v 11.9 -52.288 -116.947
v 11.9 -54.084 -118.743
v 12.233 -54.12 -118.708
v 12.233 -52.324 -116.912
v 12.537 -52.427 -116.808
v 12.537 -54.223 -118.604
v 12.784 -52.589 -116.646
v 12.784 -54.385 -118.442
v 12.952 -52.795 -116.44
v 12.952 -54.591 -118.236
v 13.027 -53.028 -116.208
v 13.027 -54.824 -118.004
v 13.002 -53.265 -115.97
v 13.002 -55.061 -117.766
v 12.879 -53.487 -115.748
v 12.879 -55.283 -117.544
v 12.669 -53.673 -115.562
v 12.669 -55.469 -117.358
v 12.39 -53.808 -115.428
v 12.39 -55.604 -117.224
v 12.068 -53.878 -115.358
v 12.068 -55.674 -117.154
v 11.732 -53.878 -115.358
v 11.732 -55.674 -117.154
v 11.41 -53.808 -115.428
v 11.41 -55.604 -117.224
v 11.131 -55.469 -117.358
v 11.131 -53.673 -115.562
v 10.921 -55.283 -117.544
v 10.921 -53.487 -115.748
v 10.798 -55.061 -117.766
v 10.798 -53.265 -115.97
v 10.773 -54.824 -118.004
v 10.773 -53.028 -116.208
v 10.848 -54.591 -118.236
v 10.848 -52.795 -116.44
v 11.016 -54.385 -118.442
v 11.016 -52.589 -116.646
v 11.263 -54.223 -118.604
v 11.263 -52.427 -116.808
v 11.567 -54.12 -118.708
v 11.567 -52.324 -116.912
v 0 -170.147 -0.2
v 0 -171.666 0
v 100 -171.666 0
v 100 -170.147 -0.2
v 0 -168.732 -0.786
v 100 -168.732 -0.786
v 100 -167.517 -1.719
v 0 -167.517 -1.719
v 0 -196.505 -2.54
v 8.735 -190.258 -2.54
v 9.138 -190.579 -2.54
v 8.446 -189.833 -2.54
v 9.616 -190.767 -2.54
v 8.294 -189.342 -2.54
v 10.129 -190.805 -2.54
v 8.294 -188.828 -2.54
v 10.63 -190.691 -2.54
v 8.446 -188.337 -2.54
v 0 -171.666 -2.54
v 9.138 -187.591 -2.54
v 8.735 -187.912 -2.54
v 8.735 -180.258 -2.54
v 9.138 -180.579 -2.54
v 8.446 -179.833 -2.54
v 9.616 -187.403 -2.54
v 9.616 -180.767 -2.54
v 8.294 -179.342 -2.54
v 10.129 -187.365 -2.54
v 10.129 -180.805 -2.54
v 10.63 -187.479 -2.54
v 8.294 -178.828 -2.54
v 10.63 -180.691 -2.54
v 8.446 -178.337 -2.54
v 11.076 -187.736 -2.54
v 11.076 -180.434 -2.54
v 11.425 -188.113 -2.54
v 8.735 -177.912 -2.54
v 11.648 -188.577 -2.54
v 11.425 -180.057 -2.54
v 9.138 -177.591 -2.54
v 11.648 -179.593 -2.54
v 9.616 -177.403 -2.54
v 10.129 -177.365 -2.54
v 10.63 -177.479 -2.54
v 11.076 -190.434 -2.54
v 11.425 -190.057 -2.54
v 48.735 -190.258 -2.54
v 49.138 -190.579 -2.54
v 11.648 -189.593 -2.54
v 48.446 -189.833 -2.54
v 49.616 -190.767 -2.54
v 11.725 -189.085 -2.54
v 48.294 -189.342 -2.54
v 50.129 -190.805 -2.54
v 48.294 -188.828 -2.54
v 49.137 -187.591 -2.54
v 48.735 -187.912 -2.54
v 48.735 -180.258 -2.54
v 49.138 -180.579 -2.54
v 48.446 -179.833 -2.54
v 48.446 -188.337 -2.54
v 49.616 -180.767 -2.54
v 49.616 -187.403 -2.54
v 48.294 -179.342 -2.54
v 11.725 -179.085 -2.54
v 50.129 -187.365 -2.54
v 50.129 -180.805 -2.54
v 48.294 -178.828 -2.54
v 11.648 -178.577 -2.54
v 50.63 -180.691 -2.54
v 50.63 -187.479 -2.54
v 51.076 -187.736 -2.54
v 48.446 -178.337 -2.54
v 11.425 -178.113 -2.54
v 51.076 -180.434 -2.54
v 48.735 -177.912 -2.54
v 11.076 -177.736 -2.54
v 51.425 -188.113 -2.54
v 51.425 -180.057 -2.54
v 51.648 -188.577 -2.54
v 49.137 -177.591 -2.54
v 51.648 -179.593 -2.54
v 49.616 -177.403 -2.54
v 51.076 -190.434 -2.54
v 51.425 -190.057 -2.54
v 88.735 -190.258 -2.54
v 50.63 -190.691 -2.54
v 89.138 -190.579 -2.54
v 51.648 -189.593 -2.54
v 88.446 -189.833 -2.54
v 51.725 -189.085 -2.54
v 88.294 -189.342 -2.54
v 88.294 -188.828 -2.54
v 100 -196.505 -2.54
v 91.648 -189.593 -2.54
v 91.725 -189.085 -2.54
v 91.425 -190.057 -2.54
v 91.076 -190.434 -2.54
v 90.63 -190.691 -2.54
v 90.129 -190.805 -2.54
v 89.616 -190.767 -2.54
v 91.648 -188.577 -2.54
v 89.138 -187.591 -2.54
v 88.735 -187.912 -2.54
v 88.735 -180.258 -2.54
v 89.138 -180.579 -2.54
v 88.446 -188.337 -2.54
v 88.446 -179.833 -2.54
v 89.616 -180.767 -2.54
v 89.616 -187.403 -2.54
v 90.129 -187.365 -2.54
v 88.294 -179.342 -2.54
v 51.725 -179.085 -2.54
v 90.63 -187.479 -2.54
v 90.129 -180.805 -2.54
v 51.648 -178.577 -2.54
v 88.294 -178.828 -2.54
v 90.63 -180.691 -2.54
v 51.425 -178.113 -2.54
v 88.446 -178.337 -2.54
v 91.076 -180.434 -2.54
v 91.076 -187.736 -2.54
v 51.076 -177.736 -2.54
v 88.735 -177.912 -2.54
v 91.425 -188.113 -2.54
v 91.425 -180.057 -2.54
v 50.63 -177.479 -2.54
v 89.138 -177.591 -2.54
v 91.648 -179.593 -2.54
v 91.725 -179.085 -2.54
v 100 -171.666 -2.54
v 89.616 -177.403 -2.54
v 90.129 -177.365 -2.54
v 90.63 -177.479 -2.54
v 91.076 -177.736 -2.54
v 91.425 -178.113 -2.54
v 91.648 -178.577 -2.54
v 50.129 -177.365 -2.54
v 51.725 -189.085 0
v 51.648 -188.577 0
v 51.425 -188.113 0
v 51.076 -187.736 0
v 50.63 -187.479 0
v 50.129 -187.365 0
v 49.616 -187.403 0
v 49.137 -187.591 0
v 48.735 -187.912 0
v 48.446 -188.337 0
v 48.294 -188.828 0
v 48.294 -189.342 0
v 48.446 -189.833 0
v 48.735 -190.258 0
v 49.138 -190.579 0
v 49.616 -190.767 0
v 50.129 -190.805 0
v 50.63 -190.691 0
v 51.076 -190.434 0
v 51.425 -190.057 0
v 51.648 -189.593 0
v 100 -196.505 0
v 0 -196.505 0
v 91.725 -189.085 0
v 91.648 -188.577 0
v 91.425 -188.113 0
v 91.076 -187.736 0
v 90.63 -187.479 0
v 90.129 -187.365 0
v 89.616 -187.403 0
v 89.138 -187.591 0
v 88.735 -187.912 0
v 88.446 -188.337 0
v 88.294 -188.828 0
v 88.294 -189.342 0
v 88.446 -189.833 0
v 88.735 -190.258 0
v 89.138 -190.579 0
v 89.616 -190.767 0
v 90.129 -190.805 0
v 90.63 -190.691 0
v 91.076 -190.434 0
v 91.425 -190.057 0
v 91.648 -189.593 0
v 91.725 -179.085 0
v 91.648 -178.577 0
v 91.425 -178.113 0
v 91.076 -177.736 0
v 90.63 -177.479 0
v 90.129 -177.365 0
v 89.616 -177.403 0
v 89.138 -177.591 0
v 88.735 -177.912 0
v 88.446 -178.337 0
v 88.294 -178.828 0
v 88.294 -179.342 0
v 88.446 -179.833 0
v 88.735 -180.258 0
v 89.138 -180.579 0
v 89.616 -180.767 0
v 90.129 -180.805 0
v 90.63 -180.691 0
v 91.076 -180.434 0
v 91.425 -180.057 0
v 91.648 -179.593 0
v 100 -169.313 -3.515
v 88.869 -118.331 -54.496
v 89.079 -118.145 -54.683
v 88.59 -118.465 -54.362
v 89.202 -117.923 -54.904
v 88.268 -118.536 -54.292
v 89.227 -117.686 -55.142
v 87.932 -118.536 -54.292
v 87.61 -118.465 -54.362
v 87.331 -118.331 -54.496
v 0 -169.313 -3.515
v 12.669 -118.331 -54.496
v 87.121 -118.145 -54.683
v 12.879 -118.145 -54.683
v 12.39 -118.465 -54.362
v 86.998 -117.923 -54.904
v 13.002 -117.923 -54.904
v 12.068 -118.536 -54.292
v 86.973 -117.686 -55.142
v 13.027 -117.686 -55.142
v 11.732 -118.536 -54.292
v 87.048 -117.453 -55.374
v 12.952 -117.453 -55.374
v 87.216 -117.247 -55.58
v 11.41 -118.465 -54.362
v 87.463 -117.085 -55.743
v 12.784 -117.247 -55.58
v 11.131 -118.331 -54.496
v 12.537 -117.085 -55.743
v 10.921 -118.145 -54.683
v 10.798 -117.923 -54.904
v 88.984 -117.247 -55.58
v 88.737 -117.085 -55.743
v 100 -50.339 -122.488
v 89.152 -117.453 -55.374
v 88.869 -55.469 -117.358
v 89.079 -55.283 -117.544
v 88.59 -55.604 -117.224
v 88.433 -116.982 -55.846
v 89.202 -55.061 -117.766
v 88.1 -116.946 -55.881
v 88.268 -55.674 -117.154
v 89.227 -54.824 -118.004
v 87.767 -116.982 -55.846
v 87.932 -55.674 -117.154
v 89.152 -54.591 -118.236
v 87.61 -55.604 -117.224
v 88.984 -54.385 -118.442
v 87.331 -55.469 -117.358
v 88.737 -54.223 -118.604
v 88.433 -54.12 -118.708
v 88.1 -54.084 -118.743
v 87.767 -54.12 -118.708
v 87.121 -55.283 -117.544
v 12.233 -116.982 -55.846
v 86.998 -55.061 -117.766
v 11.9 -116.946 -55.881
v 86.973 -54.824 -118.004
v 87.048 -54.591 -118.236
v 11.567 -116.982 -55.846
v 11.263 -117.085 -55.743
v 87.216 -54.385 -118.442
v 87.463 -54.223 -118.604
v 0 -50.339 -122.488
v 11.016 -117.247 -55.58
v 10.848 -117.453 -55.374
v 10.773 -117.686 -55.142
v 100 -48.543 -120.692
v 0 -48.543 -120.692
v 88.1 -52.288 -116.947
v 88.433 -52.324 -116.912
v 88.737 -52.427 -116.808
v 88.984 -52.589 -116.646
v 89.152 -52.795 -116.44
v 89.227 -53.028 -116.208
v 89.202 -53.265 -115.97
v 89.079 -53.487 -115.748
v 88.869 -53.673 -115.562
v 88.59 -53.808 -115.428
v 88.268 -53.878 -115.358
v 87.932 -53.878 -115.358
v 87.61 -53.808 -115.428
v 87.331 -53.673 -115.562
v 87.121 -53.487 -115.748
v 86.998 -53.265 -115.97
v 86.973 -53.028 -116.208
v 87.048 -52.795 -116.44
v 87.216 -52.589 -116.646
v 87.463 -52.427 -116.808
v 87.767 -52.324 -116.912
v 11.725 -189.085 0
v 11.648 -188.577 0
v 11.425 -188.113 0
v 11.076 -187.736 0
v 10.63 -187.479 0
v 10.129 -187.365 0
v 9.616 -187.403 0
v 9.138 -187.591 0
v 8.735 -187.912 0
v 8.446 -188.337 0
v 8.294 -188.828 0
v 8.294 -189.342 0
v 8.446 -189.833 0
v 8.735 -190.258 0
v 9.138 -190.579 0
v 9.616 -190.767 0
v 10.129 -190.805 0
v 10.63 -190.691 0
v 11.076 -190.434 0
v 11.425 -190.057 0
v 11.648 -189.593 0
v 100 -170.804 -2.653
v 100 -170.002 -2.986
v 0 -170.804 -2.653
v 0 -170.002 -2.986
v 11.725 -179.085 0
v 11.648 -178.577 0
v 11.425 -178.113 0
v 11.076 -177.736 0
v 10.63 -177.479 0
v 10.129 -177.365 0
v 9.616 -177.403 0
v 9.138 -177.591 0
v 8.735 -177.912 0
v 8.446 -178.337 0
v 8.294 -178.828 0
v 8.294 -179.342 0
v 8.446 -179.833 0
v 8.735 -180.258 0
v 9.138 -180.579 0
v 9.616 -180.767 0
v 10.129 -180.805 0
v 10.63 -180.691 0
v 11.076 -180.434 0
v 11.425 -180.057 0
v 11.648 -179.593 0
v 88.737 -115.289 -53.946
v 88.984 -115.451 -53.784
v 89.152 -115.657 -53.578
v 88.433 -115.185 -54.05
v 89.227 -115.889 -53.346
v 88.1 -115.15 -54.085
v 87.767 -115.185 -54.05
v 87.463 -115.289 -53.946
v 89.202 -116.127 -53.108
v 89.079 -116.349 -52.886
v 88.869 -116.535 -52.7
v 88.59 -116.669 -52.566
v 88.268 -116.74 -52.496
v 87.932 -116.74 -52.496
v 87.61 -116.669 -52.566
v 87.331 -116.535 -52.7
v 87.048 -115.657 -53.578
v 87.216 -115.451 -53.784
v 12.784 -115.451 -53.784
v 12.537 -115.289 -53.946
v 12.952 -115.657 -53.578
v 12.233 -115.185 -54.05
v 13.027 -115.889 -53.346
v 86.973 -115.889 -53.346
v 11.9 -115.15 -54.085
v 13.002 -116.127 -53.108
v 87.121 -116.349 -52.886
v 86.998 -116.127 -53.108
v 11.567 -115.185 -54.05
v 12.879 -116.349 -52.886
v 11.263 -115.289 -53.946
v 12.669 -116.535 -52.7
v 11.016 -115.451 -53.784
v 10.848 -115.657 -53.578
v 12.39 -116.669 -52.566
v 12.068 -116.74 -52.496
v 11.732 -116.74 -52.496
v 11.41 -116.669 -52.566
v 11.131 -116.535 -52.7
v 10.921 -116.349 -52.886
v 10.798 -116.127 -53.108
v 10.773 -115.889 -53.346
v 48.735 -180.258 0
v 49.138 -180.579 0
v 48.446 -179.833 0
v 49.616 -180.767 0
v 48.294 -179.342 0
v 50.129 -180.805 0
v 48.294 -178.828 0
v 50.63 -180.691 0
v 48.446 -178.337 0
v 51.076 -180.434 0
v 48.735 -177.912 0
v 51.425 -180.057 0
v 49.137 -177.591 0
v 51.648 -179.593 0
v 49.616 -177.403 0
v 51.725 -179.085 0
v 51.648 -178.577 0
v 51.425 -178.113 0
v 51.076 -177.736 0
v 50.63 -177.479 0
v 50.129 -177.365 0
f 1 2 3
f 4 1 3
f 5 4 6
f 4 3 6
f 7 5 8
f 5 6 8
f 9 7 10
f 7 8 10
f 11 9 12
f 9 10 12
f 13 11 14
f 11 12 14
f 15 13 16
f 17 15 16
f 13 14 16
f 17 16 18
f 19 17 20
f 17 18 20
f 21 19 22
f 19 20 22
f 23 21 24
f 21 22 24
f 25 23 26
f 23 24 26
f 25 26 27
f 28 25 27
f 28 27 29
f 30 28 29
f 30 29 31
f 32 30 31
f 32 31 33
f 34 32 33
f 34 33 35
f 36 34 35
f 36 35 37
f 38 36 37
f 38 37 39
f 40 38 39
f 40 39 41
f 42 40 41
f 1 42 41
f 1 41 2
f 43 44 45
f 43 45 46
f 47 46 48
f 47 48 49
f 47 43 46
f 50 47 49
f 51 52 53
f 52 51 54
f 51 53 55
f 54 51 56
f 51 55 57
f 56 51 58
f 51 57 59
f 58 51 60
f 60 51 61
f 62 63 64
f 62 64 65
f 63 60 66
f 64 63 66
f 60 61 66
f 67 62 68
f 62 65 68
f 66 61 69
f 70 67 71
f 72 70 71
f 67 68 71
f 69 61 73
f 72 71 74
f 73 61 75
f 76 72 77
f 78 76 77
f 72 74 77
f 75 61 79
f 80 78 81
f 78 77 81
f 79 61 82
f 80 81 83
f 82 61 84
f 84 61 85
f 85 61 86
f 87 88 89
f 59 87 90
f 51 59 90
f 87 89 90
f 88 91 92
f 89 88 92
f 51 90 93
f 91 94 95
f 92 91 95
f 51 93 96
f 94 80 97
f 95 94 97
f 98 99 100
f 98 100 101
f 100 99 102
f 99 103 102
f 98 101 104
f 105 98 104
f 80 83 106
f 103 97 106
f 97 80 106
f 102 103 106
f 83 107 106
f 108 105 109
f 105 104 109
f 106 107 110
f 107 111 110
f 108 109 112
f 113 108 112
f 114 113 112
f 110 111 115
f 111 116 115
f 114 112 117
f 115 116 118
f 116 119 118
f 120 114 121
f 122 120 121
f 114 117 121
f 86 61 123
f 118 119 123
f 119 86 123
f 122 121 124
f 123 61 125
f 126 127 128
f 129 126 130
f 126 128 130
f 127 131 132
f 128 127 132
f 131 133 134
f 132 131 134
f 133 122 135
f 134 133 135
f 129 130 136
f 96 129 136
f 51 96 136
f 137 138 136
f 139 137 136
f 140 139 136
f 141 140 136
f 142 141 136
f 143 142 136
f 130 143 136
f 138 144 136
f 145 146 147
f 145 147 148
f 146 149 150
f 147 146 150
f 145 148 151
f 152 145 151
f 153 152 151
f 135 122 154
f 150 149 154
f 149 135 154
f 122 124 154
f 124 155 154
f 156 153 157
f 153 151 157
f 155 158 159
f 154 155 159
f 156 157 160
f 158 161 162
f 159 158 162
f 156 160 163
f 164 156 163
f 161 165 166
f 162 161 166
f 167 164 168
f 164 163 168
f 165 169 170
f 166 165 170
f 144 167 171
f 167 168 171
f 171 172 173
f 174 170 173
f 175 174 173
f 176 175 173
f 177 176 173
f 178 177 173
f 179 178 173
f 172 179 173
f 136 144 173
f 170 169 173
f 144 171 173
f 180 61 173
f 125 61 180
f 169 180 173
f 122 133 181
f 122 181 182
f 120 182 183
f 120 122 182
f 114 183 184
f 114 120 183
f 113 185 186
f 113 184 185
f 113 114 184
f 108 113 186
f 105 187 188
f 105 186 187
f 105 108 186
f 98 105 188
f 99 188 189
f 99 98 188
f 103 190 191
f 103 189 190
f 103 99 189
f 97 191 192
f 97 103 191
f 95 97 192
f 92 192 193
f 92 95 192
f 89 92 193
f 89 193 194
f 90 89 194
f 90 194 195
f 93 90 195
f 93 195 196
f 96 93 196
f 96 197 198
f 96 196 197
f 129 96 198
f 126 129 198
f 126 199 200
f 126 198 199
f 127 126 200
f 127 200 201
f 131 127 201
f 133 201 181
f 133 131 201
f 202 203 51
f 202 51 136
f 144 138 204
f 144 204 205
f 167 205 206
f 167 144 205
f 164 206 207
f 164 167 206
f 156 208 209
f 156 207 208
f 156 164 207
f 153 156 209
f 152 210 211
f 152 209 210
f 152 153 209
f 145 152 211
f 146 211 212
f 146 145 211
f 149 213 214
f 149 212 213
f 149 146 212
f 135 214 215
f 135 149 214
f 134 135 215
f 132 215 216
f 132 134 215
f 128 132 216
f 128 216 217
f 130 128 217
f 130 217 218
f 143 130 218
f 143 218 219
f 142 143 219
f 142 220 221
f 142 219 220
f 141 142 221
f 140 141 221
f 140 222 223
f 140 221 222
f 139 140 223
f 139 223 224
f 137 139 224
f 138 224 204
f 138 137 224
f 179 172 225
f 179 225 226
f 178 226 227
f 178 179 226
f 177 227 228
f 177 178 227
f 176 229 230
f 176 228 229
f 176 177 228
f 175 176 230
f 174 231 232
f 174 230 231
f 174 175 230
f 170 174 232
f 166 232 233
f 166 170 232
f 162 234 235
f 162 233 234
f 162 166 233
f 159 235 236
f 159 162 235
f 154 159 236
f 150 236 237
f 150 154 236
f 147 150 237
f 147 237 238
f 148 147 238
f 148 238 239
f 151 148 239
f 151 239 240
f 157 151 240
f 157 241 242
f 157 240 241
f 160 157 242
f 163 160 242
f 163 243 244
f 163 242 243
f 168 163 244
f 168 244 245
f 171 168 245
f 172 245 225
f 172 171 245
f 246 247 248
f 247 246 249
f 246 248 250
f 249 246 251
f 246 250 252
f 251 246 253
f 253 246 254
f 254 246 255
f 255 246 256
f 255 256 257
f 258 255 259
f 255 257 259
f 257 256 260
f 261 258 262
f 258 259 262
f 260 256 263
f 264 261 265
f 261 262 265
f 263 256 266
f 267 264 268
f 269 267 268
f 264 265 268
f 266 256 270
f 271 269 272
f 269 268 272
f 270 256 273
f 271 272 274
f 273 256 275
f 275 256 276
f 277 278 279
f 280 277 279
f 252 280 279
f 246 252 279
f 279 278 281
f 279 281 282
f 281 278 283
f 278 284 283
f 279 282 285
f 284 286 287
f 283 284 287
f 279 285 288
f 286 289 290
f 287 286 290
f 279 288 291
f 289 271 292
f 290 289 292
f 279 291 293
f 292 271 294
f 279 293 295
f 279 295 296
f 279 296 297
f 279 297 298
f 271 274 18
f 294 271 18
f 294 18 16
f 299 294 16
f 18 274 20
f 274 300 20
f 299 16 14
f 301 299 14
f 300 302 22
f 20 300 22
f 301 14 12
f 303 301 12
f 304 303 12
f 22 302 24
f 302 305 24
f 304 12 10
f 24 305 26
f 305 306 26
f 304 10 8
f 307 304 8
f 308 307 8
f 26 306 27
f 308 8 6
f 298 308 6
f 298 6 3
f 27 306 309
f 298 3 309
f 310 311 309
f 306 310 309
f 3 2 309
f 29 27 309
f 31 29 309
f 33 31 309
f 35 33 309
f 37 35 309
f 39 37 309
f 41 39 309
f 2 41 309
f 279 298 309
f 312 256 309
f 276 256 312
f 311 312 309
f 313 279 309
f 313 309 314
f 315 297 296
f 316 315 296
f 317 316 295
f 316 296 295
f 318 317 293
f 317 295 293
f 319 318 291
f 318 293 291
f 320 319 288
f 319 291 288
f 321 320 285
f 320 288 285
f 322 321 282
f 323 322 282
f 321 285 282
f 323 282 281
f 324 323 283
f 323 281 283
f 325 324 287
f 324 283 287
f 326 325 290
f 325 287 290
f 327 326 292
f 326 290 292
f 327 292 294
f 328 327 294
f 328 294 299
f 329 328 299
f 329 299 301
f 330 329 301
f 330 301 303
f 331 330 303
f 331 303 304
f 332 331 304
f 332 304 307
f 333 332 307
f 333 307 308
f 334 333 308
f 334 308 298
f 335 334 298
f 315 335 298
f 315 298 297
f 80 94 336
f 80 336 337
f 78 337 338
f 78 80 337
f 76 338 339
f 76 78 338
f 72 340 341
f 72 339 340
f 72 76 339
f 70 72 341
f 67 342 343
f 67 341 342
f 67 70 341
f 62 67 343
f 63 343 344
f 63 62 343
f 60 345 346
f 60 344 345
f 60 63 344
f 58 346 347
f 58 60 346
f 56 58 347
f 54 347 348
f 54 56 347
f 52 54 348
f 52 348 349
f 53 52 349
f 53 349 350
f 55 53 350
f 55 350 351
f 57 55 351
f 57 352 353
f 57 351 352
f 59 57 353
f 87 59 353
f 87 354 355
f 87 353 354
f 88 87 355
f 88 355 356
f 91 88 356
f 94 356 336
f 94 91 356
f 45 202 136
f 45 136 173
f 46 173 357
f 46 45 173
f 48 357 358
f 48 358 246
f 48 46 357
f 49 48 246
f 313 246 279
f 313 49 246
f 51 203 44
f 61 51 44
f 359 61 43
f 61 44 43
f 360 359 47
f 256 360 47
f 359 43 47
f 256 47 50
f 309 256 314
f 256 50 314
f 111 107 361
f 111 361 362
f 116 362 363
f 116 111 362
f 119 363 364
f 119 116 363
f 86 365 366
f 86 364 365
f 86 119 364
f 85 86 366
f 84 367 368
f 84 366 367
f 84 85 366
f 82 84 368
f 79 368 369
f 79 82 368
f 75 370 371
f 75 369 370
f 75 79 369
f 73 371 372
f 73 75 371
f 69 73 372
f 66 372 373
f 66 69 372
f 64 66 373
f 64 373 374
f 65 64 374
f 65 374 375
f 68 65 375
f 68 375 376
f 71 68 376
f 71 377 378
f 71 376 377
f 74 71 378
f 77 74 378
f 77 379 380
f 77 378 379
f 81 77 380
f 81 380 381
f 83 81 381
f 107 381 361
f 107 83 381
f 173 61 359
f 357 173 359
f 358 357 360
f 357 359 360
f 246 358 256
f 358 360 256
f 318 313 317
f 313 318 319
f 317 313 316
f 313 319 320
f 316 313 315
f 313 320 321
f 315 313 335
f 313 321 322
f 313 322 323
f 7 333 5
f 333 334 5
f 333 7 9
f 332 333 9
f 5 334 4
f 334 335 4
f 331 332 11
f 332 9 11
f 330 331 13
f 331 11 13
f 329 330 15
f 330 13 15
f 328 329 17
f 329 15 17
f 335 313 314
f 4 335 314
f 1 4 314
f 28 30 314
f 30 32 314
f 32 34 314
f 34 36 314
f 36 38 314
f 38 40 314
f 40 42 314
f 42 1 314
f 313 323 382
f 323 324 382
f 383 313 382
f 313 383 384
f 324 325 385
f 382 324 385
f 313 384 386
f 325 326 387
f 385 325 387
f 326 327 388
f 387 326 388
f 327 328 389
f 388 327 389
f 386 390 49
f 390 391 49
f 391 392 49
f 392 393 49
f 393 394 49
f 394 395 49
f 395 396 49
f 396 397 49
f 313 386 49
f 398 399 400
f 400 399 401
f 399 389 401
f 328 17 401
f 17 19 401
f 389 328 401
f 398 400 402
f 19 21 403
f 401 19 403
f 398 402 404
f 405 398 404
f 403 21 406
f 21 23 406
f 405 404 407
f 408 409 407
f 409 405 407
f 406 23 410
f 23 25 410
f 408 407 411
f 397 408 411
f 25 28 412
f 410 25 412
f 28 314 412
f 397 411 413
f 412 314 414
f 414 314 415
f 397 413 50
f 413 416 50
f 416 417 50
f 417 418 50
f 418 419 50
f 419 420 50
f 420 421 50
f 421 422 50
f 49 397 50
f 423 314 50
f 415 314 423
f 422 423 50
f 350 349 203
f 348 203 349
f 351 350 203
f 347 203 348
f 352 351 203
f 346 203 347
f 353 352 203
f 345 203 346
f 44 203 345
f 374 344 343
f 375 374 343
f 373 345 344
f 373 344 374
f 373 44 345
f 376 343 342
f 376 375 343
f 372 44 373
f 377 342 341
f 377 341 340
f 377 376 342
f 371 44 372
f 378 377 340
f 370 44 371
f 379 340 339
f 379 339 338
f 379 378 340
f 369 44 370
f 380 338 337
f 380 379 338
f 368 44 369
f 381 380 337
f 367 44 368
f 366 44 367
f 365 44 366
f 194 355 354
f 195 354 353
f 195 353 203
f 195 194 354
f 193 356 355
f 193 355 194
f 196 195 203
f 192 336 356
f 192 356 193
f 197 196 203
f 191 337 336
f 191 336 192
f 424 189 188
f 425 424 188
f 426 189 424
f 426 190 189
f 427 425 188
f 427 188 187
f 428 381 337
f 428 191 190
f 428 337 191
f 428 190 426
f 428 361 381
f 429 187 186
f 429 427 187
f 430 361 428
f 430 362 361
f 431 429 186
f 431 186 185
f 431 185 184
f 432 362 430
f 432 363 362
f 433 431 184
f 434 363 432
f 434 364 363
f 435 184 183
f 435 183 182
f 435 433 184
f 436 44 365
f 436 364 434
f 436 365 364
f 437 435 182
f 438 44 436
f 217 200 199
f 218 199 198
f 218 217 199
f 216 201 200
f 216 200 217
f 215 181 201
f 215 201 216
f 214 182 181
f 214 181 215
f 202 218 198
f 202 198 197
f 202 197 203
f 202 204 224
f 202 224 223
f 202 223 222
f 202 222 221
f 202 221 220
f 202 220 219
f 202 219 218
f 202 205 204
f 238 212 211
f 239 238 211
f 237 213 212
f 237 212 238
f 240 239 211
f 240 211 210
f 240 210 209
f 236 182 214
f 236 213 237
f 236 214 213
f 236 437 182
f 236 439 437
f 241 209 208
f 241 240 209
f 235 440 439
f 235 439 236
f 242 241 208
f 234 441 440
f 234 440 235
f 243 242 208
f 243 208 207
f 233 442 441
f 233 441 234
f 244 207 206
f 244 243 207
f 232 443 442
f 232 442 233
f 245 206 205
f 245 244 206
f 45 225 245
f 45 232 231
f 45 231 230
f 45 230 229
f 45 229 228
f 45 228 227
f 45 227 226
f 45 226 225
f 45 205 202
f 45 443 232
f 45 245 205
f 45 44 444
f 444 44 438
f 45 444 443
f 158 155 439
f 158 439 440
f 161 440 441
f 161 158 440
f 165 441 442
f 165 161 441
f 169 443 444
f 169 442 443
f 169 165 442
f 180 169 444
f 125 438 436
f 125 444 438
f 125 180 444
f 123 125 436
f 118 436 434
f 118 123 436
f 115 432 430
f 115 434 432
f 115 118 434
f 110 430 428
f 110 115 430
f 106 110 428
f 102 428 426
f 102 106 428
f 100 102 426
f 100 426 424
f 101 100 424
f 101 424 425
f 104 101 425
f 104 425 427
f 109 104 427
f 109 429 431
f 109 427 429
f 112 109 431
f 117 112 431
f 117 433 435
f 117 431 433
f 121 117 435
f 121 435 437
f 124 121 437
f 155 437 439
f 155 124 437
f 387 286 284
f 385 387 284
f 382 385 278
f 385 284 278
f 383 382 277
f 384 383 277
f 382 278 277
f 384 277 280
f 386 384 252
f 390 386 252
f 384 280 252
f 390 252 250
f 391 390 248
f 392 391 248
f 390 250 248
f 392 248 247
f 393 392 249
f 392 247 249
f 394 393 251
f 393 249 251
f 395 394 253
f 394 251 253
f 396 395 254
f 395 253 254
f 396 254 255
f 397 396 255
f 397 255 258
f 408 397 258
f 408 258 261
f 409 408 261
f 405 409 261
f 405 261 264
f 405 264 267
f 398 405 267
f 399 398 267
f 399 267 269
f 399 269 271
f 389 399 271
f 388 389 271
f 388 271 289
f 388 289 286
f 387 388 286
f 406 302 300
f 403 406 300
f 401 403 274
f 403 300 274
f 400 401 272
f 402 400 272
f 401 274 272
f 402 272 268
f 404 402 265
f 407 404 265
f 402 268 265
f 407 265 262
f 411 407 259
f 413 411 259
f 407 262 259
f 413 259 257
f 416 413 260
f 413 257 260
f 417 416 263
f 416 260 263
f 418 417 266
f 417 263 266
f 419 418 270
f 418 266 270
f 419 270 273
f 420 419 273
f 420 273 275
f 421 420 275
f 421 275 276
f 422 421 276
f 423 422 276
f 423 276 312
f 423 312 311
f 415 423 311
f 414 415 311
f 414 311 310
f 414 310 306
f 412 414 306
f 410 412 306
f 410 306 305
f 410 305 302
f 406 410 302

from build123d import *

# Parameters (mm, degrees)
SKETCH1_W                  = 100
SKETCH1_H                  = 196.50497
BASE_FLANGE1_DEPTH         = 2.54
CUT_EXTRUDE1_DEPTH         = 221.500917991
CUT_EXTRUDE1_DEPTH_BACK    = 221.500917991
SKETCH1_4_R                = 1.13
SKETCHED_START             = -70.001308696
SKETCHED_BEND3_OUTLINE_R   = 1.13
SKETCHED_BEND3_DEPTH       = 55.325410031
SKETCHED_BEND3_2_DEPTH     = 100
SKETCHED_BEND3_3_DEPTH     = 100
SKETCHED_START_2           = -123
SKETCHED_BEND3_4_OUTLINE_R = 1.13
SKETCHED_BEND3_4_DEPTH     = 4
CUT_EXTRUDE3_DEPTH         = 253.225301809
CUT_EXTRUDE3_DEPTH_BACK    = 253.225301809
SKETCH19_R                 = 1.725
F_4_40_TAPPED_HOLE1_D      = 2.2606


with BuildPart() as part:
    # Base-Flange1: sheet metal written as solids
    # Sketch1 → Base-Flange1 (new body)
    with BuildSketch(Plane.XY):
        with Locations((50, -98.252485)):
            Rectangle(SKETCH1_W, SKETCH1_H)
    extrude(amount=-BASE_FLANGE1_DEPTH)

    # Sketch1<4> → Cut-Extrude1 (cut, two sides: drawn at the far end of the back side and taken through both)
    with BuildSketch(Plane.XY.offset(-CUT_EXTRUDE1_DEPTH_BACK)):
        with Locations((11.9, -6.4268)):
            Circle(SKETCH1_4_R)
        with Locations((88.1, -6.4268)):
            Circle(SKETCH1_4_R)
        with Locations((88.1, -95.3268)):
            Circle(SKETCH1_4_R)
        with Locations((11.9, -95.3268)):
            Circle(SKETCH1_4_R)
    extrude(amount=CUT_EXTRUDE1_DEPTH + CUT_EXTRUDE1_DEPTH_BACK, mode=Mode.SUBTRACT)

    # Sketched Bend3: read off the stored shape, not the designer's step
    # Sketched Bend3 outline → Sketched Bend3 (cut)
    with BuildSketch(Plane(origin=(0, 0, 0), x_dir=(1, 0, 0), z_dir=(0, 0.707106781186549, 0.707106781186546)).offset(SKETCHED_START)):
        with Locations((88.1, -44.309515504)):
            Circle(SKETCHED_BEND3_OUTLINE_R)
        with Locations((11.9, -44.309515504)):
            Circle(SKETCHED_BEND3_OUTLINE_R)
    extrude(amount=SKETCHED_BEND3_DEPTH, mode=Mode.SUBTRACT)

    # Sketched Bend3 2 outline → Sketched Bend3 2 (cut)
    with BuildSketch(Plane.YZ):
        with BuildLine():
            ThreePointArc((-171.665649191, 0), (-169.42029242, -0.446629231), (-167.516770864, -1.718521672))
            Line((-167.516770864, -1.718521672), (-166.695292536, -2.54))
            Line((-166.695292536, -2.54), (0, -2.54))
            Line((0, -2.54), (0, 0))
            Line((0, 0), (-171.665649191, 0))
        make_face()
    extrude(amount=SKETCHED_BEND3_2_DEPTH, mode=Mode.SUBTRACT)

    # Sketched Bend3 3 outline → Sketched Bend3 3 (add)
    with BuildSketch(Plane.YZ):
        with BuildLine():
            Line((-48.542978443, -120.692314093), (-166.695292536, -2.54))
            Line((-166.695292536, -2.54), (-171.665649191, -2.54))
            ThreePointArc((-171.665649191, -2.54), (-170.392308339, -2.793283244), (-169.312822088, -3.514572896))
            Line((-169.312822088, -3.514572896), (-50.339029667, -122.488365317))
            Line((-50.339029667, -122.488365317), (-48.542978443, -120.692314093))
        make_face()
    extrude(amount=SKETCHED_BEND3_3_DEPTH)

    # Sketched Bend3 4 outline → Sketched Bend3 4 (cut)
    with BuildSketch(Plane(origin=(0, 0, 0), x_dir=(1, 0, 0), z_dir=(0, 0.707106781186549, 0.707106781186546)).offset(SKETCHED_START_2)):
        with Locations((11.9, 44.590484496)):
            Circle(SKETCHED_BEND3_4_OUTLINE_R)
        with Locations((88.1, 44.590484496)):
            Circle(SKETCHED_BEND3_4_OUTLINE_R)
        with Locations((88.1, -44.309515504)):
            Circle(SKETCHED_BEND3_4_OUTLINE_R)
        with Locations((11.9, -44.309515504)):
            Circle(SKETCHED_BEND3_4_OUTLINE_R)
    extrude(amount=SKETCHED_BEND3_4_DEPTH, mode=Mode.SUBTRACT)

    # Sketch19 → Cut-Extrude3 (cut, two sides: drawn at the far end of the back side and taken through both)
    with BuildSketch(Plane.XY.offset(-CUT_EXTRUDE3_DEPTH_BACK)):
        with Locations((10, -179.08497)):
            Circle(SKETCH19_R)
        with Locations((50, -179.08497)):
            Circle(SKETCH19_R)
        with Locations((90, -179.08497)):
            Circle(SKETCH19_R)
        with Locations((50, -189.08497)):
            Circle(SKETCH19_R)
        with Locations((90, -189.08497)):
            Circle(SKETCH19_R)
        with Locations((10, -189.08497)):
            Circle(SKETCH19_R)
    extrude(amount=CUT_EXTRUDE3_DEPTH + CUT_EXTRUDE3_DEPTH_BACK, mode=Mode.SUBTRACT)

    # #4-40 Tapped Hole1 (through all)
    with Locations(Plane(origin=(88.1, -115.949205151, -53.286087384), x_dir=(0, -0.707106781187, 0.707106781187), z_dir=(0, 0.707106781187, 0.707106781187))):
        with Locations((0, 0), (0, -76.2), (-88.9, -76.2), (-88.9, 0)):
            Hole(F_4_40_TAPPED_HOLE1_D / 2)


solid = part.part
